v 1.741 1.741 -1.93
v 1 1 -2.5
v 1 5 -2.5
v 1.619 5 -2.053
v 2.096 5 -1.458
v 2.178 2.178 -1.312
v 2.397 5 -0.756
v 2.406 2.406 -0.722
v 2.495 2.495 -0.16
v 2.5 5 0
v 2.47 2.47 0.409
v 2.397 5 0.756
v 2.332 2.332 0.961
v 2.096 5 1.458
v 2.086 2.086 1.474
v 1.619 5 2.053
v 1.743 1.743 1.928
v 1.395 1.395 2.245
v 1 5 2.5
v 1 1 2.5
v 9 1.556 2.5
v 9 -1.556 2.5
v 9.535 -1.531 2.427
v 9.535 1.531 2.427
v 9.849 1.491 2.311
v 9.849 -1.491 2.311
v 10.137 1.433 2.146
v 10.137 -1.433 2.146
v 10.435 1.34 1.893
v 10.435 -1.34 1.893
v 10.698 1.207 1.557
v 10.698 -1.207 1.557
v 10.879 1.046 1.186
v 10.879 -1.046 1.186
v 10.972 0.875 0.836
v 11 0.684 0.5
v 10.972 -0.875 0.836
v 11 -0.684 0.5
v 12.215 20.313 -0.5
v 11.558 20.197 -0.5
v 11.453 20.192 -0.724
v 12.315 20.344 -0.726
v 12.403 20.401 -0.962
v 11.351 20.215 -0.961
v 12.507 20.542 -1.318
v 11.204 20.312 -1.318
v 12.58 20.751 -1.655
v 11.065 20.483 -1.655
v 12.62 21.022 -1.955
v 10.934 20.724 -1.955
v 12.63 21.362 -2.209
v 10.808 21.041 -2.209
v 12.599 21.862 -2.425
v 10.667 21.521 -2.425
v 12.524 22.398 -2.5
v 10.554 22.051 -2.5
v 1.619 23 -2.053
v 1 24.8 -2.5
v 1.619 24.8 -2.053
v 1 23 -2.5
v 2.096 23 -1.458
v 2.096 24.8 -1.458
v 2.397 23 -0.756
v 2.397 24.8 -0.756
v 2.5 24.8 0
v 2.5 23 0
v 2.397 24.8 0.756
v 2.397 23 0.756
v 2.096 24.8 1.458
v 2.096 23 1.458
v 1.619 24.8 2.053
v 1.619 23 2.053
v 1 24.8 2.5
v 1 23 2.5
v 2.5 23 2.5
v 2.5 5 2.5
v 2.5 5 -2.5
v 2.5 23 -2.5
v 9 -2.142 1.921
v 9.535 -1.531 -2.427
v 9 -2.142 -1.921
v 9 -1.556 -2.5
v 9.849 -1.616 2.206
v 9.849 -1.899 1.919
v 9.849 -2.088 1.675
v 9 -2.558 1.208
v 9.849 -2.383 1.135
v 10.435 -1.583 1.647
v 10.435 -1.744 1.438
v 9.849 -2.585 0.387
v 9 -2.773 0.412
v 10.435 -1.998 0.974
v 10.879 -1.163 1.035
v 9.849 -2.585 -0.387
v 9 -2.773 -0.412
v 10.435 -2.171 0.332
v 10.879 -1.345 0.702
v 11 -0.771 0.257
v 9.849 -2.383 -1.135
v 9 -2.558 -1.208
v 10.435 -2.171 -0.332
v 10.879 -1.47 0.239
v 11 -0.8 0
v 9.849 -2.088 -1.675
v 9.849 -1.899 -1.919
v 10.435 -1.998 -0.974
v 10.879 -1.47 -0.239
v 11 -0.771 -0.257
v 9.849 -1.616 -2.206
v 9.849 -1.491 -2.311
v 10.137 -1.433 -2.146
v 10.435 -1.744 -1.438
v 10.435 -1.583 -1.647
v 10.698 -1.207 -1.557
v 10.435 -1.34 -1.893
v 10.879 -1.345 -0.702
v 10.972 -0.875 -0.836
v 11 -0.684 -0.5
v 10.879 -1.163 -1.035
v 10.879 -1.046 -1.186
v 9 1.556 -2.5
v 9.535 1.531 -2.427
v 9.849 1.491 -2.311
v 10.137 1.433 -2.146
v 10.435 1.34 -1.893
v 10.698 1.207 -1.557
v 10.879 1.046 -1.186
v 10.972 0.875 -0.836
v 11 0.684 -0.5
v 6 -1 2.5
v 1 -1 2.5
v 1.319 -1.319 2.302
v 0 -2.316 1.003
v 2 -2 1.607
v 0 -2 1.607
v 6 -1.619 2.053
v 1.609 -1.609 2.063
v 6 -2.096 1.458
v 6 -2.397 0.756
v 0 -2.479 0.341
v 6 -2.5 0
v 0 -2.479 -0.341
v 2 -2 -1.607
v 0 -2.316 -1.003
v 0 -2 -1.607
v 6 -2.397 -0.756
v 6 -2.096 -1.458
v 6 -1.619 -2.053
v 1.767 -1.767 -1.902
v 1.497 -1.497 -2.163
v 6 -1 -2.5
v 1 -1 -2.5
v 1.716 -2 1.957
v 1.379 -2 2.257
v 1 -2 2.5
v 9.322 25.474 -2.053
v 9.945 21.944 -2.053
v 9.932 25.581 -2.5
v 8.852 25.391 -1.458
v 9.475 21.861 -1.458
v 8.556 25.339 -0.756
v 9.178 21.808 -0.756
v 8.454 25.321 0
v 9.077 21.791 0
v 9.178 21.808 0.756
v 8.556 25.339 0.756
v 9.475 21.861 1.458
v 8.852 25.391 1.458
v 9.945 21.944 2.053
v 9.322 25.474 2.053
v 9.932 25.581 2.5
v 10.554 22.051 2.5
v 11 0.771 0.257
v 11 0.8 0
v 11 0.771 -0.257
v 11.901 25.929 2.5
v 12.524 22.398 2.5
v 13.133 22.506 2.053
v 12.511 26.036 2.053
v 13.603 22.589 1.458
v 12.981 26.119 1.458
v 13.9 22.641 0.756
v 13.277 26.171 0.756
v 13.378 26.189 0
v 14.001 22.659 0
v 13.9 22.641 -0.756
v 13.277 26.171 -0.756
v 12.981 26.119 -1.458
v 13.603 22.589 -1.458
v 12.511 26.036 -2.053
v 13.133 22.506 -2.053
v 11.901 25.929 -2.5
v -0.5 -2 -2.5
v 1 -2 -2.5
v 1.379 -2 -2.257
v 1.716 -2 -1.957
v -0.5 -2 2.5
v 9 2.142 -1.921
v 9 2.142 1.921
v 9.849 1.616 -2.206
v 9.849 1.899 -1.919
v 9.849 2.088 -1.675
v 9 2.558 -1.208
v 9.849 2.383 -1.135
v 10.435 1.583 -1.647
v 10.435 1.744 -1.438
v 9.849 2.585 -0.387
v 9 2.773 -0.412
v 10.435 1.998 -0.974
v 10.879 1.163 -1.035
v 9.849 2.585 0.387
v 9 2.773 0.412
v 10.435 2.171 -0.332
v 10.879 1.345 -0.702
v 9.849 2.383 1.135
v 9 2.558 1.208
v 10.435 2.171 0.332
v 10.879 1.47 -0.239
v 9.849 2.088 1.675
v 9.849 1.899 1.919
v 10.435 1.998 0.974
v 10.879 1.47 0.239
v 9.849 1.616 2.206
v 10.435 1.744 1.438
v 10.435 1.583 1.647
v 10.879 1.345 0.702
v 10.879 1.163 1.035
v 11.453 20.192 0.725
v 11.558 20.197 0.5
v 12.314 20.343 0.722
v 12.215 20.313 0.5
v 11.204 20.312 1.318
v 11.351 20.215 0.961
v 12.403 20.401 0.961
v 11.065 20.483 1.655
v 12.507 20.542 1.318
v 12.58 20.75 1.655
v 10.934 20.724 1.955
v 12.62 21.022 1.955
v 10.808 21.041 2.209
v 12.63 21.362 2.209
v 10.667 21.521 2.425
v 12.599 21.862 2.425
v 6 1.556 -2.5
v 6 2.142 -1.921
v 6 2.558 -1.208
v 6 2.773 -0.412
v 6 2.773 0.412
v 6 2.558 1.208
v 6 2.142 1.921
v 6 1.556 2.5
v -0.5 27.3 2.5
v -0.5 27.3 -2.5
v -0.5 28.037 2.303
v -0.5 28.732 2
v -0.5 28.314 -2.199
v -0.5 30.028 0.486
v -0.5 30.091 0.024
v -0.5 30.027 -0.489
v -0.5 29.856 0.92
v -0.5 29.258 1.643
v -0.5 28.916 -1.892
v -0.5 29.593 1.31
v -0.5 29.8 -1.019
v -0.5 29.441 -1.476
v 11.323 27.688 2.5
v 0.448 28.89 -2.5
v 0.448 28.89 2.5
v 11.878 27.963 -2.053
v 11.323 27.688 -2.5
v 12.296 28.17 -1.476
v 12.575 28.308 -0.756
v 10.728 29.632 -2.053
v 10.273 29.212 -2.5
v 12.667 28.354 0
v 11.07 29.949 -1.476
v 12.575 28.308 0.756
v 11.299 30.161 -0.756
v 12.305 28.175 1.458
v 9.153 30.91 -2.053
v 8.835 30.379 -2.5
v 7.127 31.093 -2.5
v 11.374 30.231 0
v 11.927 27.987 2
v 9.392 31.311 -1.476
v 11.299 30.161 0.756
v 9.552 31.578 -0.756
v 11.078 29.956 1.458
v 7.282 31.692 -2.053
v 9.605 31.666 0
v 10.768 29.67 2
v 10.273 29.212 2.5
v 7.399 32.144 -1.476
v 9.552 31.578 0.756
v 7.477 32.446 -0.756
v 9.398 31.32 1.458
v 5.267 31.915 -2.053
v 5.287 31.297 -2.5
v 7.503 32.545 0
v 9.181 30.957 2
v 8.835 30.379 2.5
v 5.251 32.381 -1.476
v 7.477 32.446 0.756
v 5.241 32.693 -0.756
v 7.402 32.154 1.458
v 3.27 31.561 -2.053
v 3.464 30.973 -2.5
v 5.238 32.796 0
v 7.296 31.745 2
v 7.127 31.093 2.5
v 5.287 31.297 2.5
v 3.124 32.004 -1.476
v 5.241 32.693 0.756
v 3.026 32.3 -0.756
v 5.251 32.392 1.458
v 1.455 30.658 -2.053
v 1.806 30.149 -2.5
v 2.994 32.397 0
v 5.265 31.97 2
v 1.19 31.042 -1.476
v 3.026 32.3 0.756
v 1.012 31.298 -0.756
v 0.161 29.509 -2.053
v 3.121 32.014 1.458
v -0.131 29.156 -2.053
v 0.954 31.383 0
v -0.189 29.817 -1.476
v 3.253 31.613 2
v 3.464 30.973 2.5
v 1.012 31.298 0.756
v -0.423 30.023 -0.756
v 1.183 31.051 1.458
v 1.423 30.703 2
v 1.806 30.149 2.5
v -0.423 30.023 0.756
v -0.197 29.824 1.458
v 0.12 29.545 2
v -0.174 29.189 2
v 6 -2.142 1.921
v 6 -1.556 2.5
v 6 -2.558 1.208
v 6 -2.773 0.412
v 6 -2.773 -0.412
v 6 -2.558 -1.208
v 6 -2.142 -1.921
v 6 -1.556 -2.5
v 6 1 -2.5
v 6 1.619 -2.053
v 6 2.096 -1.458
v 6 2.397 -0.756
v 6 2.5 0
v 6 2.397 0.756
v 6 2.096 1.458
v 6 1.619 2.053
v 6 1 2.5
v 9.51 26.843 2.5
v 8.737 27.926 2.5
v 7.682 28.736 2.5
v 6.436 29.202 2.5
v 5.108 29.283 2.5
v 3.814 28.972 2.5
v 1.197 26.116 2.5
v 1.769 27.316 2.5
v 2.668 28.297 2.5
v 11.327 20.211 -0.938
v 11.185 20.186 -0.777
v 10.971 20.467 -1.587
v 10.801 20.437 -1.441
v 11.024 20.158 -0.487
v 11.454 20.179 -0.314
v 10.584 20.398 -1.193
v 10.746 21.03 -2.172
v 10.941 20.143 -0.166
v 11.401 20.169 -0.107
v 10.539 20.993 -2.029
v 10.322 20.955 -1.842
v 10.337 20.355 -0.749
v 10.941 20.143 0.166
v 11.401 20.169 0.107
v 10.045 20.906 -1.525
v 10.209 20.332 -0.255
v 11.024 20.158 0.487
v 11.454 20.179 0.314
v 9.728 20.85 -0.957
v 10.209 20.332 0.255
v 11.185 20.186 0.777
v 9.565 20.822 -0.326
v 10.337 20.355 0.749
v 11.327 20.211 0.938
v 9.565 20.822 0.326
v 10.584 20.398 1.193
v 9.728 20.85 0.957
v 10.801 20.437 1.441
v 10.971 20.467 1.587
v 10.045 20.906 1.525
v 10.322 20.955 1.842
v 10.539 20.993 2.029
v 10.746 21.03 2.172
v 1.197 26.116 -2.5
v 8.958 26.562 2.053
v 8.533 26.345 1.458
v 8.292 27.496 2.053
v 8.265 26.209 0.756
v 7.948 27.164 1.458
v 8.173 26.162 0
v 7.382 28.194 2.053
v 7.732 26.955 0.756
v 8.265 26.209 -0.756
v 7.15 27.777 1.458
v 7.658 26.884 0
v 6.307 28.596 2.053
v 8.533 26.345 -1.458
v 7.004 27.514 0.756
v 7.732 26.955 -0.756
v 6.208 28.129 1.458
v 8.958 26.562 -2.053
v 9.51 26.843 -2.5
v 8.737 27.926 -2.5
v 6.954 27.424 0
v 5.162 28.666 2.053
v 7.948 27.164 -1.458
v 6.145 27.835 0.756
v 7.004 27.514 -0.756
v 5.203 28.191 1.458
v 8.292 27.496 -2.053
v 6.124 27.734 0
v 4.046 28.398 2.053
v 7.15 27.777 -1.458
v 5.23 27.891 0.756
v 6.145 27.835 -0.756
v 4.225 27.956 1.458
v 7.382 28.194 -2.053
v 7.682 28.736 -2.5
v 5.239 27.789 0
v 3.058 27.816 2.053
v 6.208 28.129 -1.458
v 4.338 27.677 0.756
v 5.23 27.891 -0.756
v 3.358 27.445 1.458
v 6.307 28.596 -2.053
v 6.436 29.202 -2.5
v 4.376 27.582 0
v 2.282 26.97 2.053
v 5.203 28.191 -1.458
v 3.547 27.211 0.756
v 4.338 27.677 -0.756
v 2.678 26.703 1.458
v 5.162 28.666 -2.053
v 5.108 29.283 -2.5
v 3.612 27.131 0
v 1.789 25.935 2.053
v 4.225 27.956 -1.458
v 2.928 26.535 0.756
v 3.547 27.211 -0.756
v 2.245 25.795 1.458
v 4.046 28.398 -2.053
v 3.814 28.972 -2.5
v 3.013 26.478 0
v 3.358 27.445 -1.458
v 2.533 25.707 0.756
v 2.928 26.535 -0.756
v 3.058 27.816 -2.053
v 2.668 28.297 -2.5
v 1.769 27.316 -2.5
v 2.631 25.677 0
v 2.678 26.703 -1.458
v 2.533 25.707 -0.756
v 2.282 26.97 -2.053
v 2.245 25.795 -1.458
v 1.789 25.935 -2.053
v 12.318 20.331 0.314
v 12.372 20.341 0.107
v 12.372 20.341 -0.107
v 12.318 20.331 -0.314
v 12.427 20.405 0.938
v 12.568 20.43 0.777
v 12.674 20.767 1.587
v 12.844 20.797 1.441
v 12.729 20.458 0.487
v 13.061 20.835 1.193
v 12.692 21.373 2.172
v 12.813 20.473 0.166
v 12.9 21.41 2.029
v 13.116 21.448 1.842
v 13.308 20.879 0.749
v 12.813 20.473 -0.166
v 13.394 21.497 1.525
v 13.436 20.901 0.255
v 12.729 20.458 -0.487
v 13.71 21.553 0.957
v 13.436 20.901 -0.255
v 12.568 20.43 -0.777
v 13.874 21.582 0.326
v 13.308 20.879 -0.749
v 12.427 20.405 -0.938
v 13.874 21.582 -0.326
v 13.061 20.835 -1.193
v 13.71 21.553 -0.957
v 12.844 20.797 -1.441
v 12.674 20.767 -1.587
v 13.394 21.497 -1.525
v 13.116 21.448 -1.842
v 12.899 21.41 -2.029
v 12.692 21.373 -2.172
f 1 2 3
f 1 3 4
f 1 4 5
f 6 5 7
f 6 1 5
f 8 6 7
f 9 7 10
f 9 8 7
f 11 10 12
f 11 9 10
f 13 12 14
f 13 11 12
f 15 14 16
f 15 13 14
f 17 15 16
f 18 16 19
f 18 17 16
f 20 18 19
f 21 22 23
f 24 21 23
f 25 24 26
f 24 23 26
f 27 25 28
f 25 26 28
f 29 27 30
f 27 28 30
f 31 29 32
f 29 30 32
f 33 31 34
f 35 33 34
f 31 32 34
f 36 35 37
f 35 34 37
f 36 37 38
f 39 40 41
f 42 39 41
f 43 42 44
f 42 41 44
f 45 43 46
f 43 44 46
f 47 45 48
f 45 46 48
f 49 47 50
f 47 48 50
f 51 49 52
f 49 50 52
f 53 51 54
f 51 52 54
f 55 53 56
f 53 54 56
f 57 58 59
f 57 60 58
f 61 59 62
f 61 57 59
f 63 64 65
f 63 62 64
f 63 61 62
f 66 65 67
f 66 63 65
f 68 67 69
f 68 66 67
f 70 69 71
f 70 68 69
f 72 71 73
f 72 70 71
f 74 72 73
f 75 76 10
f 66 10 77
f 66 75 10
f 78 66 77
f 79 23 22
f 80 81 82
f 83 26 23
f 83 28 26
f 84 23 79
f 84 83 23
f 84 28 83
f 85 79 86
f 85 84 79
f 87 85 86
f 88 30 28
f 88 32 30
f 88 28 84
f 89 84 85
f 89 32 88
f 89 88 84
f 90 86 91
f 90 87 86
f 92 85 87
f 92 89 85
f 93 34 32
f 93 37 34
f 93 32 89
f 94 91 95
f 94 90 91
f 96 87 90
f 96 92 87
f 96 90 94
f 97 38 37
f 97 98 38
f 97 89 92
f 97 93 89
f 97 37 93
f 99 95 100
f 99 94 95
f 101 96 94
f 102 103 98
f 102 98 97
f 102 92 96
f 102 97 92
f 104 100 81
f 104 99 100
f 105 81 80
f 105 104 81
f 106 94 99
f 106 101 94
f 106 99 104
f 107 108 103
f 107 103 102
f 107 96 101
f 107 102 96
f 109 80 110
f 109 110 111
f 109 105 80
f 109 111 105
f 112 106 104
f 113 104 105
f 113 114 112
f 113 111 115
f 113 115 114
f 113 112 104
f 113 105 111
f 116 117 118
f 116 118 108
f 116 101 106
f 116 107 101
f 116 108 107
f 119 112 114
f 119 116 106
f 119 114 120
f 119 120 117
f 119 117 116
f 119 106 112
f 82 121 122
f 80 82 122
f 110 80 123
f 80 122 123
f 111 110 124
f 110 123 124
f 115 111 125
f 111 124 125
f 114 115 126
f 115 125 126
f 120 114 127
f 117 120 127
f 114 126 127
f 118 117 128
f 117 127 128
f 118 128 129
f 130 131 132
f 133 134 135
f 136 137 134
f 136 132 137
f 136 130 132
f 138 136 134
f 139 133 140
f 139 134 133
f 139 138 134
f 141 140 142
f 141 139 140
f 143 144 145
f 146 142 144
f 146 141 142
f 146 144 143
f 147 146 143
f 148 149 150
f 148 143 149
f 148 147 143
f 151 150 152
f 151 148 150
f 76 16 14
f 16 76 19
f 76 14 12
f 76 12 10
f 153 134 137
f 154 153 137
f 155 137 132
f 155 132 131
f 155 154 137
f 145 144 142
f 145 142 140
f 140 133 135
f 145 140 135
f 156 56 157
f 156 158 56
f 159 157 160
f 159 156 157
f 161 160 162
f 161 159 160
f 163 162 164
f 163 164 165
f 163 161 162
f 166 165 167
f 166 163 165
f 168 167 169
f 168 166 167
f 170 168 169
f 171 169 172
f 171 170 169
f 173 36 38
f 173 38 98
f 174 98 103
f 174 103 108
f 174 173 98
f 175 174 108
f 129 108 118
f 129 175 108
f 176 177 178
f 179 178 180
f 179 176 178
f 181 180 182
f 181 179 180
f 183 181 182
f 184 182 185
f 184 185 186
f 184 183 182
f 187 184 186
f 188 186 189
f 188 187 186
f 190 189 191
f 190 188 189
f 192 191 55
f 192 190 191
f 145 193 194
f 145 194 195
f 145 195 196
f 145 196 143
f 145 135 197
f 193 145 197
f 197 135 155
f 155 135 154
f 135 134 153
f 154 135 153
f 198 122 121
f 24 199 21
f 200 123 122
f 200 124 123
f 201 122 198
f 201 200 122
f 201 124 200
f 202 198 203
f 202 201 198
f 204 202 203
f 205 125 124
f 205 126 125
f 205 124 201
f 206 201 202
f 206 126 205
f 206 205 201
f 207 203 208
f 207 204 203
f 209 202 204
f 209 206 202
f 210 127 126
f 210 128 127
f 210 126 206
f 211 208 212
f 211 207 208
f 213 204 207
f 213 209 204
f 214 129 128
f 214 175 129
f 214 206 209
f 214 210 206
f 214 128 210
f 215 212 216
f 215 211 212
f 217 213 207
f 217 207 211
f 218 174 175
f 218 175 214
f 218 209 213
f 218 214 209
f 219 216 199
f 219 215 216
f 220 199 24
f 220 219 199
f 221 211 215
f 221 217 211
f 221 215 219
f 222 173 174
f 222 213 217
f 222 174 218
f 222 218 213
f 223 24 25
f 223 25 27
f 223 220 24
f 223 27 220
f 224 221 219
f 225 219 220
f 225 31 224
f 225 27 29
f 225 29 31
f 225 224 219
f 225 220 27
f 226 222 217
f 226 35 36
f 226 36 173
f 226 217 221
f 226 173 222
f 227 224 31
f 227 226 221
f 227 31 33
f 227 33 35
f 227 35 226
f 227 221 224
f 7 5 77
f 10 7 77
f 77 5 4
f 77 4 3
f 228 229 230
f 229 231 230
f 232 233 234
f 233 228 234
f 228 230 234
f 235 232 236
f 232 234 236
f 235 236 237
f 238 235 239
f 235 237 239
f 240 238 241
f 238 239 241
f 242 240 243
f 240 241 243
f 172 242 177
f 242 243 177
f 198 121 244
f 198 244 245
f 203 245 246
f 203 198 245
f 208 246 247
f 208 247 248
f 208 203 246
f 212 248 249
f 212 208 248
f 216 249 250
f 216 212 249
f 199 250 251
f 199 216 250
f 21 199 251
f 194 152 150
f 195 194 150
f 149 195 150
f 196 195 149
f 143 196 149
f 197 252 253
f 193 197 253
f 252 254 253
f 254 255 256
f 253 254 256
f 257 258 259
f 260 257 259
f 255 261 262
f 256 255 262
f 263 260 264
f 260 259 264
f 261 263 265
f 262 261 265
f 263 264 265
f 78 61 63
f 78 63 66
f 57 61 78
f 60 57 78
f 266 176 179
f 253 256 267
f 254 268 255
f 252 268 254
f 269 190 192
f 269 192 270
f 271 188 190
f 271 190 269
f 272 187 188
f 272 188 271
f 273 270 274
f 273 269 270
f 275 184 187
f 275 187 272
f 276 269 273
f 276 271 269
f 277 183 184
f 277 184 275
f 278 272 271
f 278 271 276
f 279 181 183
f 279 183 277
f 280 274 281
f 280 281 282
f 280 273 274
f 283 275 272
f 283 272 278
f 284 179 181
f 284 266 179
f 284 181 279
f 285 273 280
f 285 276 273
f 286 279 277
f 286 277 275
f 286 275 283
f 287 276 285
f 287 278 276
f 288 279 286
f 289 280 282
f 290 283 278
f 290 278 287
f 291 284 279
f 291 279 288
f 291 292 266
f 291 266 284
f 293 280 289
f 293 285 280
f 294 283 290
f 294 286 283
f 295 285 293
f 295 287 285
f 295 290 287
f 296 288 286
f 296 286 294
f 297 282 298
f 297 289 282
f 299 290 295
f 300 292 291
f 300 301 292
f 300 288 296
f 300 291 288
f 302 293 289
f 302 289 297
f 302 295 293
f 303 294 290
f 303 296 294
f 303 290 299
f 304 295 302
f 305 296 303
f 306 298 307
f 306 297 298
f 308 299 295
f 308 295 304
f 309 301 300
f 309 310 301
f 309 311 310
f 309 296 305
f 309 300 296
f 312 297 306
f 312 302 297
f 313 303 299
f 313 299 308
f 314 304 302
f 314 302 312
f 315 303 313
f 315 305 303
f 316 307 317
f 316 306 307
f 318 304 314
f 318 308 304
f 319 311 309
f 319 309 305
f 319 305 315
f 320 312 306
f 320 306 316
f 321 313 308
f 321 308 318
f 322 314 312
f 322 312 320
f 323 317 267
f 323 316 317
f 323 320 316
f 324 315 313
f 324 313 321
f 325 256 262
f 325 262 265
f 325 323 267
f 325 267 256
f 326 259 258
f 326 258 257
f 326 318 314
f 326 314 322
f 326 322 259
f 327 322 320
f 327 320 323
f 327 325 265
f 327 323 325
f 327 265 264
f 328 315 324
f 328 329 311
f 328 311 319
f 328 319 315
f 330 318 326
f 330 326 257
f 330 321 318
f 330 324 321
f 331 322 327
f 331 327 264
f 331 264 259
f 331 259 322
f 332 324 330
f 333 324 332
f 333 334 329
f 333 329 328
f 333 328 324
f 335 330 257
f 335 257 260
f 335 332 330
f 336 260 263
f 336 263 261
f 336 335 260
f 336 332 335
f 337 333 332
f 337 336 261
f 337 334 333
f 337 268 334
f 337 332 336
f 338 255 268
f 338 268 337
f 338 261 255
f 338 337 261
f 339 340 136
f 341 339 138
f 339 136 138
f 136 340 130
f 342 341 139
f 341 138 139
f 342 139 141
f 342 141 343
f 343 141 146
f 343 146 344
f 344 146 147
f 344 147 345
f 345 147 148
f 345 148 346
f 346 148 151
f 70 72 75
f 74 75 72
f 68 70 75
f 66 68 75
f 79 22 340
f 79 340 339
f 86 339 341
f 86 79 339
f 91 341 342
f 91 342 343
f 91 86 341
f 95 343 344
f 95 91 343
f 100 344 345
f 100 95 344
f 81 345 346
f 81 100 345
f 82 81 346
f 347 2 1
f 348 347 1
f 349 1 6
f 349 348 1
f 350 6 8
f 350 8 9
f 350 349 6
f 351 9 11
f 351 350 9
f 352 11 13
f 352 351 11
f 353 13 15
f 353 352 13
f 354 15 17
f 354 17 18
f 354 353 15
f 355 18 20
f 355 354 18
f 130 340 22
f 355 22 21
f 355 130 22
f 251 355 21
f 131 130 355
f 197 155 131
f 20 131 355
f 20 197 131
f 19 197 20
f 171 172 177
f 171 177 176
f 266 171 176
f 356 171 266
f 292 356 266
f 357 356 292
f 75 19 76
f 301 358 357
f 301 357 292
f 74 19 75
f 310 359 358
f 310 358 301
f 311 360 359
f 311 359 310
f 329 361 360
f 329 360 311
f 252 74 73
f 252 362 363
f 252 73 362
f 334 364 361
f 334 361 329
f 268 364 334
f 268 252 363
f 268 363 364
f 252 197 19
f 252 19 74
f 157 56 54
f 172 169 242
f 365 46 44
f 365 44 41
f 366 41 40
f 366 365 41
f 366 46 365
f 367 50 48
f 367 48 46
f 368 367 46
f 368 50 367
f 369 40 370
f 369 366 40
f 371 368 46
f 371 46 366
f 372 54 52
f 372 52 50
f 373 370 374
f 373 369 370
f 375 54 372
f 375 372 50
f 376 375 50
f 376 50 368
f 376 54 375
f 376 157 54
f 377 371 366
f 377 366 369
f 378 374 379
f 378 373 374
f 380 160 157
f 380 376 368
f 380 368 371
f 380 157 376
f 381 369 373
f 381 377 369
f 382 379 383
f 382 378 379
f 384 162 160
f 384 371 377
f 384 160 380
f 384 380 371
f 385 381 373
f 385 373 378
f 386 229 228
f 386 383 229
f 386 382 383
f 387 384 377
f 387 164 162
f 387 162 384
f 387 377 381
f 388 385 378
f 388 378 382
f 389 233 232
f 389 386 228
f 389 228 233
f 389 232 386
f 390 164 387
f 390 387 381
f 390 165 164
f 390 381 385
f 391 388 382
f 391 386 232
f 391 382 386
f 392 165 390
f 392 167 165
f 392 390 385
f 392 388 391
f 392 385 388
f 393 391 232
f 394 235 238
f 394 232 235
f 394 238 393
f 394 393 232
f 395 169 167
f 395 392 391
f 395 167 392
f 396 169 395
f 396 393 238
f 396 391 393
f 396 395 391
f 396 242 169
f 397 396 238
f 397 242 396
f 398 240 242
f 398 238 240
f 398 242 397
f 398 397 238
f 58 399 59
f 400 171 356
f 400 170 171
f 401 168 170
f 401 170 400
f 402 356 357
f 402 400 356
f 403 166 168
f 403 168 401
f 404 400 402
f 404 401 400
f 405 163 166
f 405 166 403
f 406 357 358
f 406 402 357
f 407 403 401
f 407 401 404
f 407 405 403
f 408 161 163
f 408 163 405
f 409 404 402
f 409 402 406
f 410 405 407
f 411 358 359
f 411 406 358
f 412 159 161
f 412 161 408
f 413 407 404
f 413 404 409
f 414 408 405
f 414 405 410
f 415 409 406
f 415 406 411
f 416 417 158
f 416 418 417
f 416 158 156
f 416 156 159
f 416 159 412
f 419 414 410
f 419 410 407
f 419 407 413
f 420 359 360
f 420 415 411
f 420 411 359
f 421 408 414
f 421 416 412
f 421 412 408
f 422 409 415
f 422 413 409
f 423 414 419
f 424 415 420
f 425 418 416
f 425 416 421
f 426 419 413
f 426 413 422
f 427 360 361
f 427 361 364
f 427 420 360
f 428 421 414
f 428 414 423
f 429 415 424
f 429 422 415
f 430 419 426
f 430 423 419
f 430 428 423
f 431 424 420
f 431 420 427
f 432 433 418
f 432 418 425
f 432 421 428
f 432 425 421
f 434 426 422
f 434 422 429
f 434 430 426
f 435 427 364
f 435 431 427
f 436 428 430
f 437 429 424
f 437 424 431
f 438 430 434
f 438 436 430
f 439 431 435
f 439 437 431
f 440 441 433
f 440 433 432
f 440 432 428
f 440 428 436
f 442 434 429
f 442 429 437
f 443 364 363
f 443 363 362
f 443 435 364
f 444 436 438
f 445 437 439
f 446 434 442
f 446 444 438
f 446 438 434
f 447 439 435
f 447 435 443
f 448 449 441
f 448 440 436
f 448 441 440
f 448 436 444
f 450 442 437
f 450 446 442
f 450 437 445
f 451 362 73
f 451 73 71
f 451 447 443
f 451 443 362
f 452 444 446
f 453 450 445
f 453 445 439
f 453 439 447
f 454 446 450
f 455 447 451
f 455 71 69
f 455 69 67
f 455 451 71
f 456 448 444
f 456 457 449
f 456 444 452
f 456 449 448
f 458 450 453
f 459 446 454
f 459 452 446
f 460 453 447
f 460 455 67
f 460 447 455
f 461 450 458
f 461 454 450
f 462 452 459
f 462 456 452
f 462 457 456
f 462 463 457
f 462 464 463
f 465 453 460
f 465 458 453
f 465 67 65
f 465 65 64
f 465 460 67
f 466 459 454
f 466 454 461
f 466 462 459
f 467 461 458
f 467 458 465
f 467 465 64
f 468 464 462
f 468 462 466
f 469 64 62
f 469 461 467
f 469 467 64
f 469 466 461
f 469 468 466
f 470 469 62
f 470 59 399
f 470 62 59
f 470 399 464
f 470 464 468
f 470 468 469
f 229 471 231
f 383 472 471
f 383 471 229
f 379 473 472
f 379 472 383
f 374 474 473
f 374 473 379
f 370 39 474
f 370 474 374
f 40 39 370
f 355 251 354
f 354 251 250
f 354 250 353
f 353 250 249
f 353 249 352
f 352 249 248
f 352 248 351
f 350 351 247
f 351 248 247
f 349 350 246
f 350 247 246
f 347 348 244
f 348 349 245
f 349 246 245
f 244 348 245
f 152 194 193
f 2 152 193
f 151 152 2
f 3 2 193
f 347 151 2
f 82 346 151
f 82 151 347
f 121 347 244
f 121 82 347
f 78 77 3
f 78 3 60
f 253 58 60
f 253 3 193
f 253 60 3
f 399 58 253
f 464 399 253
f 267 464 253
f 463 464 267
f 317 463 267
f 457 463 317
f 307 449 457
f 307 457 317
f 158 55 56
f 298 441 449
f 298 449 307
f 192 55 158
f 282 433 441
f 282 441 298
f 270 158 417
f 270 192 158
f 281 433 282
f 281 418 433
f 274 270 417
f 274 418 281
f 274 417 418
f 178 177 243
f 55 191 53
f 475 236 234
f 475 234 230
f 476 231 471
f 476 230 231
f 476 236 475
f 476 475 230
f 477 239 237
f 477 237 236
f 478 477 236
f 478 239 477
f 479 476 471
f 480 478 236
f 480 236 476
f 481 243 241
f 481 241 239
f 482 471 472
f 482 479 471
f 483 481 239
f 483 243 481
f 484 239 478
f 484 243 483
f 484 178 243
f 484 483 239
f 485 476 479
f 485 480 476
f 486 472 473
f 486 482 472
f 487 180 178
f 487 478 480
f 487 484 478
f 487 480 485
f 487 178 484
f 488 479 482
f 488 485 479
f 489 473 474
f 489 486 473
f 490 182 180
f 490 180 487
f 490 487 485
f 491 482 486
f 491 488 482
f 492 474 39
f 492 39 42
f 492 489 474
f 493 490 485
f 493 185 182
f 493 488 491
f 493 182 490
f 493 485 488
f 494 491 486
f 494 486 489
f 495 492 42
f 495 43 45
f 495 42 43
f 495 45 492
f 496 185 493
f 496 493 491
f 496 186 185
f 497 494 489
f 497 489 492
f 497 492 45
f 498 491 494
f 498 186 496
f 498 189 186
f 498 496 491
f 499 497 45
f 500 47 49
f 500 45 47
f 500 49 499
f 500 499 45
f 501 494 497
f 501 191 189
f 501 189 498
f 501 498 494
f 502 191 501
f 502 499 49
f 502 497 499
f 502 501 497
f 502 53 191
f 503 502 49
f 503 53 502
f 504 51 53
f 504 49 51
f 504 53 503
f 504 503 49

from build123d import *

# Parameters (mm, degrees)
EXTRUDE_1_DEPTH     = 5
SKETCH_19_W         = 5
SKETCH_19_H         = 18
EXTRUDE_2_DEPTH     = 1.5
FILLET_2_R          = 2
SKETCH_20_W         = 8
SKETCH_20_H         = 40
CUT_EXTRUDE_1_DEPTH = 36.961786675


with BuildPart() as part:
    # 扫描2: sweep along a path in 草图1
    with BuildLine(Plane.XY) as sweep_2_path:
        Line((11.886241035, 20.255064977), (10.916442642, 25.755064977))
        ThreePointArc((10.916442642, 25.755064977), (5.020643415, 30.27907084), (0, 24.8))
        Line((0, 24.8), (0, 0))
        Line((0, 0), (0, -2))
    # 草图13 → 扫描2 (sweep)
    with BuildSketch(Plane(origin=(0, -2, 0), x_dir=(1, 0, 0), z_dir=(0, 1, 0))):
        with BuildLine():
            Line((-1, -2.5), (1, -2.5))
            ThreePointArc((1, -2.5), (2.5, 0), (1, 2.5))
            Line((1, 2.5), (-1, 2.5))
            ThreePointArc((-1, 2.5), (-2.5, 0), (-1, -2.5))
        make_face()
    sweep(path=sweep_2_path.line)

    # 扫描4: sweep along a path in 草图15
    with BuildLine(Plane.XY) as sweep_4_path:
        Line((0, 0), (11, 0))
    # 草图16 → 扫描4 (sweep)
    with BuildSketch(Plane(origin=(11, 0, 0), x_dir=(0, 0, -1), z_dir=(1, 0, 0))):
        with BuildLine():
            Line((-2.5, -1), (-2.5, 1))
            ThreePointArc((-2.5, 1), (0, 2.5), (2.5, 1))
            Line((2.5, 1), (2.5, -1))
            ThreePointArc((2.5, -1), (0, -2.5), (-2.5, -1))
        make_face()
    sweep(path=sweep_4_path.line)

    # 草图17 → 凸台-拉伸1 (add)
    with BuildSketch(Plane(origin=(11, 0, 0), x_dir=(0, 0, -1), z_dir=(1, 0, 0))):
        with BuildLine():
            Line((-2.5, 1.555522876), (-2.5, -1.555522876))
            ThreePointArc((-2.5, -1.555522876), (0, -2.8), (2.5, -1.555522876))
            Line((2.5, -1.555522876), (2.5, 1.555522876))
            ThreePointArc((2.5, 1.555522876), (0, 2.8), (-2.5, 1.555522876))
        make_face()
    extrude(amount=-EXTRUDE_1_DEPTH)

    # 草图19 → 凸台-拉伸2 (add)
    with BuildSketch(Plane(origin=(1, 0, 0), x_dir=(0, 0, -1), z_dir=(1, 0, 0))):
        with Locations((0, 14)):
            Rectangle(SKETCH_19_W, SKETCH_19_H)
    extrude(amount=EXTRUDE_2_DEPTH)

    # 圆角2
    # the kernel refuses this fillet: 2 mm, written as the material it takes off along each edge
    with BuildSketch(Plane(origin=(17.795087554, 21.296954043, 2.5), x_dir=(0, 0, -1), z_dir=(-0.9848077530122092, -0.17364817766692373, 0))) as fillet_2_piece_1:
        with BuildLine():
            CenterArc((FILLET_2_R, -FILLET_2_R), FILLET_2_R, 90, 90)
            Line((0, -FILLET_2_R), (0, 0))
            Line((0, 0), (FILLET_2_R, 0))
        make_face()
    extrude(amount=12, mode=Mode.SUBTRACT)
    with BuildSketch(Plane(origin=(12.214510286, 20.312947703, 0), x_dir=(0.9423506208781959, 0.16616183974819204, -0.29045748456869663), z_dir=(0.2860447827236766, 0.05043741288507259, 0.9568878981667733))) as fillet_2_piece_2:
        with BuildLine():
            CenterArc((2.833333333 - FILLET_2_R, FILLET_2_R), FILLET_2_R, 270, 90)
            Line((2.833333333 - FILLET_2_R, 0), (2.833333333, 0))
            Line((2.833333333, 0), (2.833333333, FILLET_2_R))
        make_face()
    revolve(axis=Axis((12.214510286, 20.312947703, 0), (-0.173648177666923, 0.9848077530122094, 0)), revolution_arc=326.229306127, mode=Mode.SUBTRACT)
    with BuildSketch(Plane(origin=(5.977394517, 19.213175911, -2.5), x_dir=(-0.17364817766692373, 0.9848077530122092, 0), z_dir=(0.9848077530122092, 0.17364817766692373, 0))) as fillet_2_piece_3:
        with BuildLine():
            CenterArc((FILLET_2_R, FILLET_2_R), FILLET_2_R, 180, 90)
            Line((0, FILLET_2_R), (0, 0))
            Line((0, 0), (FILLET_2_R, 0))
        make_face()
    extrude(amount=12, mode=Mode.SUBTRACT)
    with BuildSketch(Plane(origin=(11, -6.555522876, 2.5), x_dir=(0, 0, -1), z_dir=(0, 1, 0))) as fillet_2_piece_4:
        with BuildLine():
            CenterArc((FILLET_2_R, FILLET_2_R), FILLET_2_R, 180, 90)
            Line((0, FILLET_2_R), (0, 0))
            Line((0, 0), (FILLET_2_R, 0))
        make_face()
    extrude(amount=13.111045751, mode=Mode.SUBTRACT)
    with BuildSketch(Plane(origin=(11, 6.555522876, -2.5), x_dir=(-1, 0, 0), z_dir=(0, -1, 0))) as fillet_2_piece_5:
        with BuildLine():
            CenterArc((FILLET_2_R, -FILLET_2_R), FILLET_2_R, 90, 90)
            Line((0, -FILLET_2_R), (0, 0))
            Line((0, 0), (FILLET_2_R, 0))
        make_face()
    extrude(amount=13.111045751, mode=Mode.SUBTRACT)
    with BuildSketch(Plane(origin=(11, -0.333333333, 0), x_dir=(0, -0.8131785022115455, -0.582014367125922), z_dir=(0, -0.582014367125922, 0.8131785022115455))) as fillet_2_piece_6:
        with BuildLine():
            CenterArc((3.133333333 - FILLET_2_R, -FILLET_2_R), FILLET_2_R, 0, 90)
            Line((3.133333333, -FILLET_2_R), (3.133333333, 0))
            Line((3.133333333, 0), (3.133333333 - FILLET_2_R, 0))
        make_face()
    revolve(axis=Axis((11, -0.333333333, 0), (1, 0, 0)), revolution_arc=288.815304863, mode=Mode.SUBTRACT)
    with BuildSketch(Plane(origin=(11, 0.333333333, 0), x_dir=(0, 0.8131785022115376, 0.5820143671259329), z_dir=(0, 0.5820143671259329, -0.8131785022115376))) as fillet_2_piece_7:
        with BuildLine():
            CenterArc((3.133333333 - FILLET_2_R, -FILLET_2_R), FILLET_2_R, 0, 90)
            Line((3.133333333 - FILLET_2_R, 0), (3.133333333, 0))
            Line((3.133333333, 0), (3.133333333, -FILLET_2_R))
        make_face()
    revolve(axis=Axis((11, 0.333333333, 0), (1, 0, 0)), revolution_arc=288.815304863, mode=Mode.SUBTRACT)
    with BuildSketch(Plane(origin=(11.557971784, 20.197182251, 0), x_dir=(-0.9423506208781961, -0.16616183974819207, 0.2904574845686964), z_dir=(-0.2860447827236764, -0.05043741288507257, -0.9568878981667737))) as fillet_2_piece_8:
        with BuildLine():
            CenterArc((2.833333333 - FILLET_2_R, FILLET_2_R), FILLET_2_R, 270, 90)
            Line((2.833333333, FILLET_2_R), (2.833333333, 0))
            Line((2.833333333, 0), (2.833333333 - FILLET_2_R, 0))
        make_face()
    revolve(axis=Axis((11.557971784, 20.197182251, 0), (-0.17364817766692306, 0.9848077530122095, 0)), revolution_arc=326.229306127, mode=Mode.SUBTRACT)

    # 草图20 → 切除-拉伸1 (cut, through all)
    with BuildSketch(Plane(origin=(-0.5, 0, 0), x_dir=(0, 0, -1), z_dir=(1, 0, 0))):
        with Locations((0, 16)):
            Rectangle(SKETCH_20_W, SKETCH_20_H)
    extrude(amount=-CUT_EXTRUDE_1_DEPTH, mode=Mode.SUBTRACT)


solid = part.part
